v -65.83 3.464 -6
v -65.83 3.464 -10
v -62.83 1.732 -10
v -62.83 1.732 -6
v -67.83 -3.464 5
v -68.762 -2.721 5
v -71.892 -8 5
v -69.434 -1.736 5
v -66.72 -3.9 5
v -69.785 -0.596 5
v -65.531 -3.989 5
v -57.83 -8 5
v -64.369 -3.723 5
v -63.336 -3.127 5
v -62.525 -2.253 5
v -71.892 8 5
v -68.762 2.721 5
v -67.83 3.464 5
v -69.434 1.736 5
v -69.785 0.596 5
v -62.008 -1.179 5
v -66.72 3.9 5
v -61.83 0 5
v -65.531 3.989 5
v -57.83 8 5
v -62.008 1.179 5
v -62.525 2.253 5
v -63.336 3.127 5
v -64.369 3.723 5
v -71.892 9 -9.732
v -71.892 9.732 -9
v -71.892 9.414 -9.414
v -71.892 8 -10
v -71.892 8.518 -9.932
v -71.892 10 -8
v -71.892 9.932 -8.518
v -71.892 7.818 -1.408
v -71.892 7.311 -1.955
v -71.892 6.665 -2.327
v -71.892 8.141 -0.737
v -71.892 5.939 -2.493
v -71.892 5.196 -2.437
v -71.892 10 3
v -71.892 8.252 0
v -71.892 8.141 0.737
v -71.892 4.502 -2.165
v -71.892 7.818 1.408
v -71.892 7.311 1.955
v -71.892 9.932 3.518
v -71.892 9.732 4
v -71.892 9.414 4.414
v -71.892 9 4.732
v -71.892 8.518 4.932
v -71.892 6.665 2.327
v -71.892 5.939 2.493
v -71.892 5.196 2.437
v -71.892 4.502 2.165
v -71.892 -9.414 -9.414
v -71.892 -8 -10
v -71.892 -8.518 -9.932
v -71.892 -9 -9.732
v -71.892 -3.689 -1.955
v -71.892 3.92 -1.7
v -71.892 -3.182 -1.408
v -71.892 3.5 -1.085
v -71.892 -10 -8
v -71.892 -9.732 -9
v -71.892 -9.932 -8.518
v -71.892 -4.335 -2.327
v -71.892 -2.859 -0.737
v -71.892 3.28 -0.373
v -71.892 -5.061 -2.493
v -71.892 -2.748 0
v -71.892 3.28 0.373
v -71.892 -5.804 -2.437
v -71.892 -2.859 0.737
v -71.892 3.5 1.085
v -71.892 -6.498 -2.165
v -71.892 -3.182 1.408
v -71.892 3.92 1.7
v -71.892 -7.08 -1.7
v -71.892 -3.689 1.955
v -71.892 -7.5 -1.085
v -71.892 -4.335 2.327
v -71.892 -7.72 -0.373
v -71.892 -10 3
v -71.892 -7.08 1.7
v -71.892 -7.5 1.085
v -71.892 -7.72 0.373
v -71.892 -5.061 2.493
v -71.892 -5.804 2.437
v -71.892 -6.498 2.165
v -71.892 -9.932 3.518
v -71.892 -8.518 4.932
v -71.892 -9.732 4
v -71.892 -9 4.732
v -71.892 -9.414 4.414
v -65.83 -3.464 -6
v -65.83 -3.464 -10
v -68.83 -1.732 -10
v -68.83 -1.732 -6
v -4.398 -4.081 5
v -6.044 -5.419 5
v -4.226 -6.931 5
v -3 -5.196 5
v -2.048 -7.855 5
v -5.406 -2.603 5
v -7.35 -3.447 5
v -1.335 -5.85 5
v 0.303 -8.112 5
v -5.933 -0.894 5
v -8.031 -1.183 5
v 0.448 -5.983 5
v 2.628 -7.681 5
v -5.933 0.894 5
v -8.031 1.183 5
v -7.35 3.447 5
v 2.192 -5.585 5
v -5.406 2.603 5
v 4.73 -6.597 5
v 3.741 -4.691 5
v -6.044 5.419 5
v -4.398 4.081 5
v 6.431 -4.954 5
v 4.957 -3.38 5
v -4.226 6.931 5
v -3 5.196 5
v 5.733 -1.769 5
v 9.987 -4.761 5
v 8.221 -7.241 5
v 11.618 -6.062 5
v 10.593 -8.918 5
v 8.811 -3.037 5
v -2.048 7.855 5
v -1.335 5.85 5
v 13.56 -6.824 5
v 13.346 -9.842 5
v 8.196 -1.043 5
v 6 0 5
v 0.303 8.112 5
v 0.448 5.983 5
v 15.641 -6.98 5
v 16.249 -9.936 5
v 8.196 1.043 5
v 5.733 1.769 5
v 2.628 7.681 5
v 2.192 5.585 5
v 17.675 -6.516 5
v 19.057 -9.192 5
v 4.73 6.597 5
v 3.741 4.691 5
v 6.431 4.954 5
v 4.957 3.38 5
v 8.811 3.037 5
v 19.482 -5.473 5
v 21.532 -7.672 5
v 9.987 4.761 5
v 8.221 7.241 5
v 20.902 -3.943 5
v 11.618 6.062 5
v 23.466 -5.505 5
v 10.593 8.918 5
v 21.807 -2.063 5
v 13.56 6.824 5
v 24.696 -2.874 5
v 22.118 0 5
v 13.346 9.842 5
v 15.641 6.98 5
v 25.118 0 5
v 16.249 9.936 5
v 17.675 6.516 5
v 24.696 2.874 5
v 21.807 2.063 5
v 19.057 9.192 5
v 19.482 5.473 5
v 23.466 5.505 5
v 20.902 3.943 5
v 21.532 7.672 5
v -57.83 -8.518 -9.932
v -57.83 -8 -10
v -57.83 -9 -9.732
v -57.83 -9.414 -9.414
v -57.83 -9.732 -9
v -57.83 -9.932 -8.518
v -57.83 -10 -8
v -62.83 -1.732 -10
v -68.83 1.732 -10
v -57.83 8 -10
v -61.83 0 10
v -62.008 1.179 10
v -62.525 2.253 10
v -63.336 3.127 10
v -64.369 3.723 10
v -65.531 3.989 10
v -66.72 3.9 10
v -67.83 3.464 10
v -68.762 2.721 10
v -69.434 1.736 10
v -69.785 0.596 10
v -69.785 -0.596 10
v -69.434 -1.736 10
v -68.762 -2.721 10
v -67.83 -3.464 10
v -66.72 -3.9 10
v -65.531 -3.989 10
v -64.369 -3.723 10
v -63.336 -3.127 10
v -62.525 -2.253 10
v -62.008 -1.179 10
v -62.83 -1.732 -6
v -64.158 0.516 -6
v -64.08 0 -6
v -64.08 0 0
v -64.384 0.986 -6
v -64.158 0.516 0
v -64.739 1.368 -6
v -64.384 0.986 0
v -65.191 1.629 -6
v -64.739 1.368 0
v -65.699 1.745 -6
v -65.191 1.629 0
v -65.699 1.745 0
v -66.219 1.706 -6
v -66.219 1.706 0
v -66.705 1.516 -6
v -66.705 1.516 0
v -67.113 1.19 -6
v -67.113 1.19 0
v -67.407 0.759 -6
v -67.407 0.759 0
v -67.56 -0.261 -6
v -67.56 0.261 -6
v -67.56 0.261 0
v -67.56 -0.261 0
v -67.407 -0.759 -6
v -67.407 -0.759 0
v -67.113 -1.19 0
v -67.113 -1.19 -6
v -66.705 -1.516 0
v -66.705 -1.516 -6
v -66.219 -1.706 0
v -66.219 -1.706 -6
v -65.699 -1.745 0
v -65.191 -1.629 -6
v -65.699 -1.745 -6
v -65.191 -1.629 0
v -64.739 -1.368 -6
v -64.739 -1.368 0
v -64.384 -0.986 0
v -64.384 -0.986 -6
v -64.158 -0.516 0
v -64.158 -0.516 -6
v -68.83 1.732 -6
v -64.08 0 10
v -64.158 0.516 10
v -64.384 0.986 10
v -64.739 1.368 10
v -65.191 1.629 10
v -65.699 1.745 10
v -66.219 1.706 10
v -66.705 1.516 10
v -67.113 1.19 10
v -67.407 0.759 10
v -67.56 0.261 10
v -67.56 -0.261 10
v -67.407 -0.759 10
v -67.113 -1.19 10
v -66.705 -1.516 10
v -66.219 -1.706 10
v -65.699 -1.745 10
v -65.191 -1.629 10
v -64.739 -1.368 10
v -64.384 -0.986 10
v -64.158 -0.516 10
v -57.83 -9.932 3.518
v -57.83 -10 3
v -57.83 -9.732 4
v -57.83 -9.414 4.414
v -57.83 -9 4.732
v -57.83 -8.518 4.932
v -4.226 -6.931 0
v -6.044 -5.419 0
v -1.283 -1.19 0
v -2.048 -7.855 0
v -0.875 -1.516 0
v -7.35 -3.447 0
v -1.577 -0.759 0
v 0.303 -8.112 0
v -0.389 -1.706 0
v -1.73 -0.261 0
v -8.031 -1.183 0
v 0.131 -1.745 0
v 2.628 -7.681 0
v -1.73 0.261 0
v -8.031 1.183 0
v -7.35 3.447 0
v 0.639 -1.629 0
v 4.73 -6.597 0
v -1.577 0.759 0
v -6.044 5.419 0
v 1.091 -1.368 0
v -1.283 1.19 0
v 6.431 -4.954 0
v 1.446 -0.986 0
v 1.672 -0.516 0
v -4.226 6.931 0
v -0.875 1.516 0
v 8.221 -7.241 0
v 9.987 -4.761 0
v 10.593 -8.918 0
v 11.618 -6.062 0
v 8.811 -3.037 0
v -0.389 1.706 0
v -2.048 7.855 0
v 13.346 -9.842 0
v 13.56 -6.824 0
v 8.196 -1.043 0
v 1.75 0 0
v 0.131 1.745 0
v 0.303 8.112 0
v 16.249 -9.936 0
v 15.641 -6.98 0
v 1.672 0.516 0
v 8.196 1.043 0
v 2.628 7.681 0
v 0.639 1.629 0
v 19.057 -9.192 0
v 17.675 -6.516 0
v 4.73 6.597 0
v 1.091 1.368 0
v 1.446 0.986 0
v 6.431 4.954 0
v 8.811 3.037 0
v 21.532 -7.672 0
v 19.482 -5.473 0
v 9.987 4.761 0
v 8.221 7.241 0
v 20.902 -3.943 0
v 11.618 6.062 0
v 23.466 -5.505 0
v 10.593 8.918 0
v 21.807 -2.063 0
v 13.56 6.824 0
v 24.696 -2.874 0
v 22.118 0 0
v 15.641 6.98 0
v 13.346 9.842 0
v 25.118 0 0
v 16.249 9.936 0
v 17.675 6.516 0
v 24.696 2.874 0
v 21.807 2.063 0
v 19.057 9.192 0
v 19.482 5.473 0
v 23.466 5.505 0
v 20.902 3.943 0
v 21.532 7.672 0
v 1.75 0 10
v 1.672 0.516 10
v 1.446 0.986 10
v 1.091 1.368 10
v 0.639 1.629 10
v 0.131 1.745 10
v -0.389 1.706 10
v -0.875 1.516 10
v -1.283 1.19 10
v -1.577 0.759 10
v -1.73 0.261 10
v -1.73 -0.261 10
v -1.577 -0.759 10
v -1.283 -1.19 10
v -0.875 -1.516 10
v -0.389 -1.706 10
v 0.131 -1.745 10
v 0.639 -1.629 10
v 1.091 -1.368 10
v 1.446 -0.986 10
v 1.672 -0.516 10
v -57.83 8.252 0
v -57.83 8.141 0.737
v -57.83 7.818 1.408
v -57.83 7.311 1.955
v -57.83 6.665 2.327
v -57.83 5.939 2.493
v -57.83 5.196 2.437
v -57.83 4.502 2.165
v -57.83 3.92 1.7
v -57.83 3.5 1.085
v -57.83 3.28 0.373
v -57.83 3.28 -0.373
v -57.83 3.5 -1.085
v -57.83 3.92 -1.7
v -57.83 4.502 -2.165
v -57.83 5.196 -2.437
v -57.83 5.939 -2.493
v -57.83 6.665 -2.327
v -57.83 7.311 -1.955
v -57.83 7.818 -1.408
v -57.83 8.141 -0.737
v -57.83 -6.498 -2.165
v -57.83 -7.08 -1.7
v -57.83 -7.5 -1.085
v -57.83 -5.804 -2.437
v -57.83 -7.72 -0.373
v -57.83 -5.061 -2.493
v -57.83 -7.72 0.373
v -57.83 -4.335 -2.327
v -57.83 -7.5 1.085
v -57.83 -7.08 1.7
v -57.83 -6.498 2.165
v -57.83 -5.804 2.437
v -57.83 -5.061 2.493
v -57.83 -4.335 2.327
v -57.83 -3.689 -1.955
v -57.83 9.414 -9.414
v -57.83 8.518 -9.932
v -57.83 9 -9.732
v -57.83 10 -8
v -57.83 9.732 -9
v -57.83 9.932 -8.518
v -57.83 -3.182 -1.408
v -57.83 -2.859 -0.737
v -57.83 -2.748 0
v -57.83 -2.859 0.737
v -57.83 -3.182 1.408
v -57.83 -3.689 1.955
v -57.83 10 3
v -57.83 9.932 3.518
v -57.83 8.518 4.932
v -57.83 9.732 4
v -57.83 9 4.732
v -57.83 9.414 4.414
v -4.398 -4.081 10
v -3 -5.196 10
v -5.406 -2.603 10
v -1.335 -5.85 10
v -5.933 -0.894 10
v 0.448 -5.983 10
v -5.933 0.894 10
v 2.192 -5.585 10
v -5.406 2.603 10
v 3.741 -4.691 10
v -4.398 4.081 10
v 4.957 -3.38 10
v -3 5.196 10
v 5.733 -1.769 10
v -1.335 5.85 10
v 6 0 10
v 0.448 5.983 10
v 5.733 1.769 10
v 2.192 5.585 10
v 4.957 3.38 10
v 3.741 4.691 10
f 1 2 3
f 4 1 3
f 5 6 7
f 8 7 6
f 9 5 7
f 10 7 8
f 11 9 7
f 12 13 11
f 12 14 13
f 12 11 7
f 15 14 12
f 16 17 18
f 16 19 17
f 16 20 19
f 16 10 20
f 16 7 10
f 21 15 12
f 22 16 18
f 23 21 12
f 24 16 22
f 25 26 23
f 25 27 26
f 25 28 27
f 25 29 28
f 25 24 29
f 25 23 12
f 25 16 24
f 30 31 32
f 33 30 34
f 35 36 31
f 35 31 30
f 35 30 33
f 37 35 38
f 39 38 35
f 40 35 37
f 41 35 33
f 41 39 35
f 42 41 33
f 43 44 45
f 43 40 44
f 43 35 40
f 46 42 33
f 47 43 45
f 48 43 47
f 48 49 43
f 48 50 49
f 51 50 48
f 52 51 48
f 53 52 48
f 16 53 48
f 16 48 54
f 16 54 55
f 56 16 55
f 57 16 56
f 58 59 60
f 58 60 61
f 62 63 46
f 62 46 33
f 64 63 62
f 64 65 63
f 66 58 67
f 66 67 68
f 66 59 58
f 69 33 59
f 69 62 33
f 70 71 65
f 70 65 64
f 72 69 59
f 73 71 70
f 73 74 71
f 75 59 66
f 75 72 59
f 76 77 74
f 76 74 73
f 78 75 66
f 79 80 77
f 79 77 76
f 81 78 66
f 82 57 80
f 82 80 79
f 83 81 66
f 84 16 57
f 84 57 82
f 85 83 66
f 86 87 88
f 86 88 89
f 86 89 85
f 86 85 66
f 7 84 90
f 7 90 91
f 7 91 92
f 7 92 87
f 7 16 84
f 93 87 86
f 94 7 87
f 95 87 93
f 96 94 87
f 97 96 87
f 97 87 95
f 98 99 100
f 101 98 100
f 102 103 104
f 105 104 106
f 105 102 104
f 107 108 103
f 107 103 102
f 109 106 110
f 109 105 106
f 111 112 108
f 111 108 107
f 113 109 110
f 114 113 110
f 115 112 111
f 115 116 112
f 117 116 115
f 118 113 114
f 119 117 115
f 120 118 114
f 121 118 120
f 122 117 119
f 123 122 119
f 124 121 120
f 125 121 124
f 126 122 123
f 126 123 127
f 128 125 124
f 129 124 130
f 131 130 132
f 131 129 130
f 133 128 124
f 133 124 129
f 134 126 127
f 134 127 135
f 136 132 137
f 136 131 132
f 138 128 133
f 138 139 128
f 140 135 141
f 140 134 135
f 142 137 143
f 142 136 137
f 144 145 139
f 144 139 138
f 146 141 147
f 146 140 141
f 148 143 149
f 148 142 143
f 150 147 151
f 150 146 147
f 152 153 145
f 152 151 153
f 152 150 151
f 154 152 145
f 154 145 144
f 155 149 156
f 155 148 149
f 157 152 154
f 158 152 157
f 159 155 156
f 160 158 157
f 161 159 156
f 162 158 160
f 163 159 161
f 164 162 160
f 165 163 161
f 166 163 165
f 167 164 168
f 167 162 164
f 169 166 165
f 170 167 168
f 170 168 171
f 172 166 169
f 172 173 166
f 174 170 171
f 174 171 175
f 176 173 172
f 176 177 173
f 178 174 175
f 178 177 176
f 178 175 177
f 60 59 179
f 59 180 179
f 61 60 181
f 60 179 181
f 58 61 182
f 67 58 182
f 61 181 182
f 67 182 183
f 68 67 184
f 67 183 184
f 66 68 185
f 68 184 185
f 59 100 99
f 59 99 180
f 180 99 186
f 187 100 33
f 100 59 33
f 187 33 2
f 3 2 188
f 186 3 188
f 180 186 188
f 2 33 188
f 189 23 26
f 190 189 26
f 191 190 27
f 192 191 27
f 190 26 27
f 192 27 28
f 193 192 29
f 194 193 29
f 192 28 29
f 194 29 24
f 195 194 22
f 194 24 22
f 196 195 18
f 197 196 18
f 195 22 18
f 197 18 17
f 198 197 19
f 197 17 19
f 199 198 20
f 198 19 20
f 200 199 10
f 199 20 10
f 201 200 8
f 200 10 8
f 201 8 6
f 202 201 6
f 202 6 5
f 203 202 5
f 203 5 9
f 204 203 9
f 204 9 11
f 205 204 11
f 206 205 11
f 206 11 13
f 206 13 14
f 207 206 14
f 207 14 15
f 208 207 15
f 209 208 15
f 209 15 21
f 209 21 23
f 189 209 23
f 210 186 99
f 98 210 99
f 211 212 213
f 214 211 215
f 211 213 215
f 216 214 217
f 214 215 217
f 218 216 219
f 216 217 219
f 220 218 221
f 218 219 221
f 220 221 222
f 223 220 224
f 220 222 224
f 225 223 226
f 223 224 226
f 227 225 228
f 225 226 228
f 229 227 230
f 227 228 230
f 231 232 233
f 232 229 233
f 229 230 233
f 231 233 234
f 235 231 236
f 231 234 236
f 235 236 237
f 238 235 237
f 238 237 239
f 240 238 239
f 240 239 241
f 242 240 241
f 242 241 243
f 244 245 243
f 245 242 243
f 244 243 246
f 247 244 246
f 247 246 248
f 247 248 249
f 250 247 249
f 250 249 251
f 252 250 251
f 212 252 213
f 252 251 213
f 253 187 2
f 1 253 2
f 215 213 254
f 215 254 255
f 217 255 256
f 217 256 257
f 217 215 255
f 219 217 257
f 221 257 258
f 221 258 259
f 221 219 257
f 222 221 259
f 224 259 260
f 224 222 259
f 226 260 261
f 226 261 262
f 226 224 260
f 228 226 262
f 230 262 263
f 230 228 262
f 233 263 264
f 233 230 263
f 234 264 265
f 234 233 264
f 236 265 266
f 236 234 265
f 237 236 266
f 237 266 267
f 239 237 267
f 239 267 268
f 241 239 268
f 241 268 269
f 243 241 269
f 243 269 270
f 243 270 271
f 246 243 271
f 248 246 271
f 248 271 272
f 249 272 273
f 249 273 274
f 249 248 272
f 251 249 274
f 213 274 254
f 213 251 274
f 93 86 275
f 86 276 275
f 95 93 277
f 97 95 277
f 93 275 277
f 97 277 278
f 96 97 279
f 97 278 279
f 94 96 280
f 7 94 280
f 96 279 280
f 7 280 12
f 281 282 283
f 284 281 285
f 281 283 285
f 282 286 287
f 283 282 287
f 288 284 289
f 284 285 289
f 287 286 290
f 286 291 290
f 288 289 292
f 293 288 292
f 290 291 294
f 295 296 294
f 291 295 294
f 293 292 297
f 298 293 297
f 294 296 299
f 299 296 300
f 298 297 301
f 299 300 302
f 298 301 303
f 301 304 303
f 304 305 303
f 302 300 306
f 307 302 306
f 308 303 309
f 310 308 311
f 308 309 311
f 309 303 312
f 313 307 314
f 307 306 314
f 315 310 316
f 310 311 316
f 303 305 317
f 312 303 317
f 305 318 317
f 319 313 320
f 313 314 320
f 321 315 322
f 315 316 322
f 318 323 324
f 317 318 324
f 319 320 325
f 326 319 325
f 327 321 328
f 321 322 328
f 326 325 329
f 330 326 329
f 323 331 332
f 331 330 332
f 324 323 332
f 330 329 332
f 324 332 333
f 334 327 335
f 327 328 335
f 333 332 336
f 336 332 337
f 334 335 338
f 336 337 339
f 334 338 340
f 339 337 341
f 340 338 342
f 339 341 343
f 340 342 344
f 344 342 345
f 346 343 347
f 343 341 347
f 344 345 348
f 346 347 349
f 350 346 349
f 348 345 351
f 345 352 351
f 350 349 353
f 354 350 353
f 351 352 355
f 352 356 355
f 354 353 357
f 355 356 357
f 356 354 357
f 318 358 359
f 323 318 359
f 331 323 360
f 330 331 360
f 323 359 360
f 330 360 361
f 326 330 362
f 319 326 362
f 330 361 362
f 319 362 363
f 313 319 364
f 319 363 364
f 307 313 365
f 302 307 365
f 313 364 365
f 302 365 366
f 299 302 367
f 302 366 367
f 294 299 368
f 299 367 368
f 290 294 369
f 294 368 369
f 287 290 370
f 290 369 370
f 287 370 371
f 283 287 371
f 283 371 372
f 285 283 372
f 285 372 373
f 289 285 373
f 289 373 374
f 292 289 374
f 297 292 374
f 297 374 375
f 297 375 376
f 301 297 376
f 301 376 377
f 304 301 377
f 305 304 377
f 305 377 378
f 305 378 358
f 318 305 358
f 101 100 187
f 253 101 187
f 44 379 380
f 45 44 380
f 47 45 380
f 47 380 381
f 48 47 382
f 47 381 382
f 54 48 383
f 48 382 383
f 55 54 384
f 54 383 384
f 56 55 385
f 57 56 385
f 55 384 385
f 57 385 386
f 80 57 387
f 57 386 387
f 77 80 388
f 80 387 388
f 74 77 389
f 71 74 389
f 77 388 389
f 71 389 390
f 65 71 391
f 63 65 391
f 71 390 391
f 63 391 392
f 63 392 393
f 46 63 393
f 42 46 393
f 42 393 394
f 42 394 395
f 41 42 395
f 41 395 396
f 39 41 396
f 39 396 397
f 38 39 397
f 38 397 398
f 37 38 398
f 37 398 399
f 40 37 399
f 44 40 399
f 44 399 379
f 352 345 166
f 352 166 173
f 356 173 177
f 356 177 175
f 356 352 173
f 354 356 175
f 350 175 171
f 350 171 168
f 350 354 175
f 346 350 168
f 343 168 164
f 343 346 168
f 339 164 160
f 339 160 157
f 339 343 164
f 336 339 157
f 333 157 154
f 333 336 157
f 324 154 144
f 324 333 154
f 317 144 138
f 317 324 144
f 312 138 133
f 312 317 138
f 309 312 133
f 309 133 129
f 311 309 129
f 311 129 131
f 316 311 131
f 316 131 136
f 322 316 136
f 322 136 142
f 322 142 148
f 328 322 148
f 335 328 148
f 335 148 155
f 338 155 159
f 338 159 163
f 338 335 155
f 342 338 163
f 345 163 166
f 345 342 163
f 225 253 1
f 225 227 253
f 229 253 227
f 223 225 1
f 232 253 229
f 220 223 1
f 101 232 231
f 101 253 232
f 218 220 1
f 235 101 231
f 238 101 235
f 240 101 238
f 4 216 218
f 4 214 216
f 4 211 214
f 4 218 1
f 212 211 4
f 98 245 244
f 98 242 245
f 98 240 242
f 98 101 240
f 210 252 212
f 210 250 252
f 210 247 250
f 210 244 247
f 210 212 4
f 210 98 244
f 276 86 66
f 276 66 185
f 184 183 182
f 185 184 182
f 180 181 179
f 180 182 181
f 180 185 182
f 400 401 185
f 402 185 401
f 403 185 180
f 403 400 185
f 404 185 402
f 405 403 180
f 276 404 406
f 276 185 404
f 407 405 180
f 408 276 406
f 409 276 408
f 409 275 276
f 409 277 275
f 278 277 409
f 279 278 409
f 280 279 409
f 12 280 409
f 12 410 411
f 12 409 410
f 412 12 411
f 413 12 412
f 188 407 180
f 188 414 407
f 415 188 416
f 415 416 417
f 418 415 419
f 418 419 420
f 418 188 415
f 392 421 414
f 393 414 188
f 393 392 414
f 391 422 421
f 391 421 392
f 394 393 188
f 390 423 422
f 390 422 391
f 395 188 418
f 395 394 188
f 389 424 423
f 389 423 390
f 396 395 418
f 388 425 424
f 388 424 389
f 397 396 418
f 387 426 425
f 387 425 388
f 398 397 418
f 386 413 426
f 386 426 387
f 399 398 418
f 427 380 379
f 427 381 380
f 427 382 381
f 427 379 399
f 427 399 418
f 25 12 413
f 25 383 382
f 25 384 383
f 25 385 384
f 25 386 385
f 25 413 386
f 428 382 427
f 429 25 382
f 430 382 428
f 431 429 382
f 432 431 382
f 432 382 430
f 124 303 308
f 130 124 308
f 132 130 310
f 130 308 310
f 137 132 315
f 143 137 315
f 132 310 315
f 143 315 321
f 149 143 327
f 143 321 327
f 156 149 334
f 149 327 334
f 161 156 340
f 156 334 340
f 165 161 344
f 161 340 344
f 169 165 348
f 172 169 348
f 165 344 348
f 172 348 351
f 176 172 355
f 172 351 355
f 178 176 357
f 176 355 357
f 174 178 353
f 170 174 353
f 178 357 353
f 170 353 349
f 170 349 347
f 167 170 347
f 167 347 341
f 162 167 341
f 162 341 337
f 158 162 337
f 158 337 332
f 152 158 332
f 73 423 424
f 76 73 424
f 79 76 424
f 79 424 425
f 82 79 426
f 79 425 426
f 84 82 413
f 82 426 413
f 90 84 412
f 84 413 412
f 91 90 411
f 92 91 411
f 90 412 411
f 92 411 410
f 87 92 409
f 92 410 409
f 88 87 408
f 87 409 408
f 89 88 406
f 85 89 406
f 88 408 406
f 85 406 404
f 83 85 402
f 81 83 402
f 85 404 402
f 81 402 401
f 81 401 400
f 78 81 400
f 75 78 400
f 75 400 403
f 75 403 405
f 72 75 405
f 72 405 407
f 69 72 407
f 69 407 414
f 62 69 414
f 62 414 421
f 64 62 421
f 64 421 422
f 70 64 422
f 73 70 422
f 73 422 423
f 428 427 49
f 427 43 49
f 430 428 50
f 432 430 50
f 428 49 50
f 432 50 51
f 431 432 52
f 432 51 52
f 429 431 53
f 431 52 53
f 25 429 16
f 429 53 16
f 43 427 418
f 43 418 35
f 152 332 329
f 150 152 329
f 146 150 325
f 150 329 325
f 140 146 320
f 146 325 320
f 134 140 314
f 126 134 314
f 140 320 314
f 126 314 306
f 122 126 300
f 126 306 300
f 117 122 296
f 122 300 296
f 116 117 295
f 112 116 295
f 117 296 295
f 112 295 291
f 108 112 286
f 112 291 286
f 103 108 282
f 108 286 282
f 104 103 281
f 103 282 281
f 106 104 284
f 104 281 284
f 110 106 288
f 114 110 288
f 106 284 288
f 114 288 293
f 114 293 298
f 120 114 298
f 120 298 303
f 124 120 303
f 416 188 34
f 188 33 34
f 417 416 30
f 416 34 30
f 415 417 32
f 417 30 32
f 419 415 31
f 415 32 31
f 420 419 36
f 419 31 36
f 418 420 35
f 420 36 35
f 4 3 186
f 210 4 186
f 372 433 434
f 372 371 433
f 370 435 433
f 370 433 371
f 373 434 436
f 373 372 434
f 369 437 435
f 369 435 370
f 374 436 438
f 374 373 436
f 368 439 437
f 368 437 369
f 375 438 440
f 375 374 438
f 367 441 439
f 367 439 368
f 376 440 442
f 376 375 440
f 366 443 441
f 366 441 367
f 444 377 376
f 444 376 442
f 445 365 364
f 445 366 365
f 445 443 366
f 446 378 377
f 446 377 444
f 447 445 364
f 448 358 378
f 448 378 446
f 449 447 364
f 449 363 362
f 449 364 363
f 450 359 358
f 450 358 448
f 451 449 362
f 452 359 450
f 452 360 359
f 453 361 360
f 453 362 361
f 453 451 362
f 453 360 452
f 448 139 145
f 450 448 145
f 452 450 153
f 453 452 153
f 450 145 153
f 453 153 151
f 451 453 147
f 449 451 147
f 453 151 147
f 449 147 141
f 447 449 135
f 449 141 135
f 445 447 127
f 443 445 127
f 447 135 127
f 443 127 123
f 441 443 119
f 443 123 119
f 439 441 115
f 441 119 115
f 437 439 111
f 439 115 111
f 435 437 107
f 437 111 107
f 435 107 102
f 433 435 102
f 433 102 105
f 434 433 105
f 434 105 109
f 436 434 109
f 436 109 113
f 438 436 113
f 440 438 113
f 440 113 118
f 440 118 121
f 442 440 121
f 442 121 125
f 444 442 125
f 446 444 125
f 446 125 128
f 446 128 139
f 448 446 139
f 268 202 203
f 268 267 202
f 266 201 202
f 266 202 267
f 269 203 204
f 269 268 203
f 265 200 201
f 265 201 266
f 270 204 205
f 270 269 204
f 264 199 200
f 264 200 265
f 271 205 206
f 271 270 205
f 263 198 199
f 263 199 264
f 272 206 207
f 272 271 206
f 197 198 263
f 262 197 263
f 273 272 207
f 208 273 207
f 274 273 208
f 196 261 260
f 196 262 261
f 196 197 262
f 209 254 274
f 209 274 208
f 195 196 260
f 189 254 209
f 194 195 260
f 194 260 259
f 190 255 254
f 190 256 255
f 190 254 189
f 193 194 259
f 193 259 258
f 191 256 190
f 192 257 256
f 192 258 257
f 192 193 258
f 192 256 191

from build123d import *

# Parameters (mm, degrees)
F0_R          = 6
F0_R_2        = 7
F1_DEPTH      = 5
F2_DEPTH      = 10
F3_R          = 1.75
F4_DEPTH      = 25
F5_R          = 4
F6_DEPTH      = 5
F6_DEPTH_BACK = 10
F5_R_2        = 1.75
F7_DEPTH      = 10
F7_DEPTH_BACK = 10
F8_DEPTH      = 5
F8_DEPTH_BACK = 10
F9_R          = 2.5
F10_DEPTH     = 20
F11_R         = 2
F12_R         = 1.75
F13_DEPTH     = 4


with BuildPart() as f1:
    # F0 (on Top) → F1 (new body)
    with BuildSketch(Plane.XY):
        with BuildLine():
            ThreePointArc((6.431165807, -4.9538393006), (25.1179072089, 0), (6.431165807, 4.9538393006))
            ThreePointArc((6.431165807, 4.9538393006), (-8.1179072089, 0), (6.431165807, -4.9538393006))
        make_face()
        Circle(F0_R, mode=Mode.SUBTRACT)
        with Locations((15.1179072089, 0)):
            Circle(F0_R_2, mode=Mode.SUBTRACT)
    extrude(amount=F1_DEPTH)

    # F0 (on Top) → F2 (join)
    with BuildSketch(Plane.XY):
        Circle(F0_R)
    extrude(amount=F2_DEPTH)

    # F3 (on face) → F4 (cut)
    with BuildSketch(Plane.XY.offset(10)):
        Circle(F3_R)
    extrude(amount=-F4_DEPTH, mode=Mode.SUBTRACT)


with BuildPart() as f6:
    # F5 (on Top) → F6 (new body, two sides)
    with BuildSketch(Plane.XY) as f6_sk:
        with BuildLine():
            Line((-60.8299699426, -3.3166247904), (-60.8299699426, 3.3166247904))
            ThreePointArc((-60.8299699426, 3.3166247904), (-71.8299699426, 0), (-60.8299699426, -3.3166247904))
        make_face()
        with Locations((-65.8299699426, 0)):
            Circle(F5_R, mode=Mode.SUBTRACT)
        with BuildLine():
            ThreePointArc((-60.8299699426, -3.3166247904), (-60.085407296, -1.7320508076), (-59.8299699426, 0))
            ThreePointArc((-59.8299699426, 0), (-60.085407296, 1.7320508076), (-60.8299699426, 3.3166247904))
            Line((-60.8299699426, 3.3166247904), (-60.8299699426, -3.3166247904))
        make_face()
    extrude(amount=F6_DEPTH)
    extrude(f6_sk.sketch, amount=-F6_DEPTH_BACK)

    # F5 (on Top) → F7 (join, two sides)
    with BuildSketch(Plane.XY) as f7_sk:
        with Locations((-65.8299699426, 0)):
            Circle(F5_R)
        with Locations((-65.8299699426, 0)):
            Circle(F5_R_2, mode=Mode.SUBTRACT)
    extrude(amount=F7_DEPTH)
    extrude(f7_sk.sketch, amount=-F7_DEPTH_BACK)

    # F5 (on Top) → F8 (join, two sides)
    with BuildSketch(Plane.XY) as f8_sk:
        with BuildLine():
            ThreePointArc((-60.8299699426, 3.3166247904), (-60.085407296, 1.7320508076), (-59.8299699426, 0))
            ThreePointArc((-59.8299699426, 0), (-60.085407296, -1.7320508076), (-60.8299699426, -3.3166247904))
            Line((-60.8299699426, -3.3166247904), (-60.8299699426, -10))
            Line((-60.8299699426, -10), (-57.8299699426, -10))
            Line((-57.8299699426, -10), (-57.8299699426, 10))
            Line((-57.8299699426, 10), (-60.8299699426, 10))
            Line((-60.8299699426, 10), (-60.8299699426, 3.3166247904))
        make_face()
        with BuildLine():
            ThreePointArc((-60.8299699426, -3.3166247904), (-71.8299699426, 0), (-60.8299699426, 3.3166247904))
            Line((-60.8299699426, 3.3166247904), (-60.8299699426, 10))
            Line((-60.8299699426, 10), (-71.8917399645, 10))
            Line((-71.8917399645, 10), (-71.8917399645, -10))
            Line((-71.8917399645, -10), (-60.8299699426, -10))
            Line((-60.8299699426, -10), (-60.8299699426, -3.3166247904))
        make_face()
    extrude(amount=F8_DEPTH)
    extrude(f8_sk.sketch, amount=-F8_DEPTH_BACK)

    # F9 (on face) → F10 (cut)
    with BuildSketch(Plane.YZ.offset(-57.8299699426)):
        with Locations((-5.2478685975, 0)):
            Circle(F9_R)
        with Locations((5.7521314025, 0)):
            Circle(F9_R)
    extrude(amount=-F10_DEPTH, mode=Mode.SUBTRACT)

    # F11
    f11_edges = [f6.edges().sort_by_distance(p)[0] for p in [
        (-64.860855, -10, 5),
        (-64.860855, -10, -10),
        (-64.860855, 10, 5),
        (-64.860855, 10, -10),
    ]]
    fillet(f11_edges, radius=F11_R)

    # F12 (on face) → F13 (cut)
    with BuildSketch(Plane(origin=(0, 0, -10), x_dir=(1, 0, 0), z_dir=(0, 0, -1))):
        Polygon((-62.8299699426, -1.7320508076), (-62.8299699426, 1.7320508076), (-65.8299699426, 3.4641016151), (-68.8299699426, 1.7320508076), (-68.8299699426, -1.7320508076), (-65.8299699426, -3.4641016151), align=None)
        with Locations((-65.8299699426, 0)):
            Circle(F12_R, mode=Mode.SUBTRACT)
    extrude(amount=-F13_DEPTH, mode=Mode.SUBTRACT)


solid = Compound([f1.part, f6.part])
